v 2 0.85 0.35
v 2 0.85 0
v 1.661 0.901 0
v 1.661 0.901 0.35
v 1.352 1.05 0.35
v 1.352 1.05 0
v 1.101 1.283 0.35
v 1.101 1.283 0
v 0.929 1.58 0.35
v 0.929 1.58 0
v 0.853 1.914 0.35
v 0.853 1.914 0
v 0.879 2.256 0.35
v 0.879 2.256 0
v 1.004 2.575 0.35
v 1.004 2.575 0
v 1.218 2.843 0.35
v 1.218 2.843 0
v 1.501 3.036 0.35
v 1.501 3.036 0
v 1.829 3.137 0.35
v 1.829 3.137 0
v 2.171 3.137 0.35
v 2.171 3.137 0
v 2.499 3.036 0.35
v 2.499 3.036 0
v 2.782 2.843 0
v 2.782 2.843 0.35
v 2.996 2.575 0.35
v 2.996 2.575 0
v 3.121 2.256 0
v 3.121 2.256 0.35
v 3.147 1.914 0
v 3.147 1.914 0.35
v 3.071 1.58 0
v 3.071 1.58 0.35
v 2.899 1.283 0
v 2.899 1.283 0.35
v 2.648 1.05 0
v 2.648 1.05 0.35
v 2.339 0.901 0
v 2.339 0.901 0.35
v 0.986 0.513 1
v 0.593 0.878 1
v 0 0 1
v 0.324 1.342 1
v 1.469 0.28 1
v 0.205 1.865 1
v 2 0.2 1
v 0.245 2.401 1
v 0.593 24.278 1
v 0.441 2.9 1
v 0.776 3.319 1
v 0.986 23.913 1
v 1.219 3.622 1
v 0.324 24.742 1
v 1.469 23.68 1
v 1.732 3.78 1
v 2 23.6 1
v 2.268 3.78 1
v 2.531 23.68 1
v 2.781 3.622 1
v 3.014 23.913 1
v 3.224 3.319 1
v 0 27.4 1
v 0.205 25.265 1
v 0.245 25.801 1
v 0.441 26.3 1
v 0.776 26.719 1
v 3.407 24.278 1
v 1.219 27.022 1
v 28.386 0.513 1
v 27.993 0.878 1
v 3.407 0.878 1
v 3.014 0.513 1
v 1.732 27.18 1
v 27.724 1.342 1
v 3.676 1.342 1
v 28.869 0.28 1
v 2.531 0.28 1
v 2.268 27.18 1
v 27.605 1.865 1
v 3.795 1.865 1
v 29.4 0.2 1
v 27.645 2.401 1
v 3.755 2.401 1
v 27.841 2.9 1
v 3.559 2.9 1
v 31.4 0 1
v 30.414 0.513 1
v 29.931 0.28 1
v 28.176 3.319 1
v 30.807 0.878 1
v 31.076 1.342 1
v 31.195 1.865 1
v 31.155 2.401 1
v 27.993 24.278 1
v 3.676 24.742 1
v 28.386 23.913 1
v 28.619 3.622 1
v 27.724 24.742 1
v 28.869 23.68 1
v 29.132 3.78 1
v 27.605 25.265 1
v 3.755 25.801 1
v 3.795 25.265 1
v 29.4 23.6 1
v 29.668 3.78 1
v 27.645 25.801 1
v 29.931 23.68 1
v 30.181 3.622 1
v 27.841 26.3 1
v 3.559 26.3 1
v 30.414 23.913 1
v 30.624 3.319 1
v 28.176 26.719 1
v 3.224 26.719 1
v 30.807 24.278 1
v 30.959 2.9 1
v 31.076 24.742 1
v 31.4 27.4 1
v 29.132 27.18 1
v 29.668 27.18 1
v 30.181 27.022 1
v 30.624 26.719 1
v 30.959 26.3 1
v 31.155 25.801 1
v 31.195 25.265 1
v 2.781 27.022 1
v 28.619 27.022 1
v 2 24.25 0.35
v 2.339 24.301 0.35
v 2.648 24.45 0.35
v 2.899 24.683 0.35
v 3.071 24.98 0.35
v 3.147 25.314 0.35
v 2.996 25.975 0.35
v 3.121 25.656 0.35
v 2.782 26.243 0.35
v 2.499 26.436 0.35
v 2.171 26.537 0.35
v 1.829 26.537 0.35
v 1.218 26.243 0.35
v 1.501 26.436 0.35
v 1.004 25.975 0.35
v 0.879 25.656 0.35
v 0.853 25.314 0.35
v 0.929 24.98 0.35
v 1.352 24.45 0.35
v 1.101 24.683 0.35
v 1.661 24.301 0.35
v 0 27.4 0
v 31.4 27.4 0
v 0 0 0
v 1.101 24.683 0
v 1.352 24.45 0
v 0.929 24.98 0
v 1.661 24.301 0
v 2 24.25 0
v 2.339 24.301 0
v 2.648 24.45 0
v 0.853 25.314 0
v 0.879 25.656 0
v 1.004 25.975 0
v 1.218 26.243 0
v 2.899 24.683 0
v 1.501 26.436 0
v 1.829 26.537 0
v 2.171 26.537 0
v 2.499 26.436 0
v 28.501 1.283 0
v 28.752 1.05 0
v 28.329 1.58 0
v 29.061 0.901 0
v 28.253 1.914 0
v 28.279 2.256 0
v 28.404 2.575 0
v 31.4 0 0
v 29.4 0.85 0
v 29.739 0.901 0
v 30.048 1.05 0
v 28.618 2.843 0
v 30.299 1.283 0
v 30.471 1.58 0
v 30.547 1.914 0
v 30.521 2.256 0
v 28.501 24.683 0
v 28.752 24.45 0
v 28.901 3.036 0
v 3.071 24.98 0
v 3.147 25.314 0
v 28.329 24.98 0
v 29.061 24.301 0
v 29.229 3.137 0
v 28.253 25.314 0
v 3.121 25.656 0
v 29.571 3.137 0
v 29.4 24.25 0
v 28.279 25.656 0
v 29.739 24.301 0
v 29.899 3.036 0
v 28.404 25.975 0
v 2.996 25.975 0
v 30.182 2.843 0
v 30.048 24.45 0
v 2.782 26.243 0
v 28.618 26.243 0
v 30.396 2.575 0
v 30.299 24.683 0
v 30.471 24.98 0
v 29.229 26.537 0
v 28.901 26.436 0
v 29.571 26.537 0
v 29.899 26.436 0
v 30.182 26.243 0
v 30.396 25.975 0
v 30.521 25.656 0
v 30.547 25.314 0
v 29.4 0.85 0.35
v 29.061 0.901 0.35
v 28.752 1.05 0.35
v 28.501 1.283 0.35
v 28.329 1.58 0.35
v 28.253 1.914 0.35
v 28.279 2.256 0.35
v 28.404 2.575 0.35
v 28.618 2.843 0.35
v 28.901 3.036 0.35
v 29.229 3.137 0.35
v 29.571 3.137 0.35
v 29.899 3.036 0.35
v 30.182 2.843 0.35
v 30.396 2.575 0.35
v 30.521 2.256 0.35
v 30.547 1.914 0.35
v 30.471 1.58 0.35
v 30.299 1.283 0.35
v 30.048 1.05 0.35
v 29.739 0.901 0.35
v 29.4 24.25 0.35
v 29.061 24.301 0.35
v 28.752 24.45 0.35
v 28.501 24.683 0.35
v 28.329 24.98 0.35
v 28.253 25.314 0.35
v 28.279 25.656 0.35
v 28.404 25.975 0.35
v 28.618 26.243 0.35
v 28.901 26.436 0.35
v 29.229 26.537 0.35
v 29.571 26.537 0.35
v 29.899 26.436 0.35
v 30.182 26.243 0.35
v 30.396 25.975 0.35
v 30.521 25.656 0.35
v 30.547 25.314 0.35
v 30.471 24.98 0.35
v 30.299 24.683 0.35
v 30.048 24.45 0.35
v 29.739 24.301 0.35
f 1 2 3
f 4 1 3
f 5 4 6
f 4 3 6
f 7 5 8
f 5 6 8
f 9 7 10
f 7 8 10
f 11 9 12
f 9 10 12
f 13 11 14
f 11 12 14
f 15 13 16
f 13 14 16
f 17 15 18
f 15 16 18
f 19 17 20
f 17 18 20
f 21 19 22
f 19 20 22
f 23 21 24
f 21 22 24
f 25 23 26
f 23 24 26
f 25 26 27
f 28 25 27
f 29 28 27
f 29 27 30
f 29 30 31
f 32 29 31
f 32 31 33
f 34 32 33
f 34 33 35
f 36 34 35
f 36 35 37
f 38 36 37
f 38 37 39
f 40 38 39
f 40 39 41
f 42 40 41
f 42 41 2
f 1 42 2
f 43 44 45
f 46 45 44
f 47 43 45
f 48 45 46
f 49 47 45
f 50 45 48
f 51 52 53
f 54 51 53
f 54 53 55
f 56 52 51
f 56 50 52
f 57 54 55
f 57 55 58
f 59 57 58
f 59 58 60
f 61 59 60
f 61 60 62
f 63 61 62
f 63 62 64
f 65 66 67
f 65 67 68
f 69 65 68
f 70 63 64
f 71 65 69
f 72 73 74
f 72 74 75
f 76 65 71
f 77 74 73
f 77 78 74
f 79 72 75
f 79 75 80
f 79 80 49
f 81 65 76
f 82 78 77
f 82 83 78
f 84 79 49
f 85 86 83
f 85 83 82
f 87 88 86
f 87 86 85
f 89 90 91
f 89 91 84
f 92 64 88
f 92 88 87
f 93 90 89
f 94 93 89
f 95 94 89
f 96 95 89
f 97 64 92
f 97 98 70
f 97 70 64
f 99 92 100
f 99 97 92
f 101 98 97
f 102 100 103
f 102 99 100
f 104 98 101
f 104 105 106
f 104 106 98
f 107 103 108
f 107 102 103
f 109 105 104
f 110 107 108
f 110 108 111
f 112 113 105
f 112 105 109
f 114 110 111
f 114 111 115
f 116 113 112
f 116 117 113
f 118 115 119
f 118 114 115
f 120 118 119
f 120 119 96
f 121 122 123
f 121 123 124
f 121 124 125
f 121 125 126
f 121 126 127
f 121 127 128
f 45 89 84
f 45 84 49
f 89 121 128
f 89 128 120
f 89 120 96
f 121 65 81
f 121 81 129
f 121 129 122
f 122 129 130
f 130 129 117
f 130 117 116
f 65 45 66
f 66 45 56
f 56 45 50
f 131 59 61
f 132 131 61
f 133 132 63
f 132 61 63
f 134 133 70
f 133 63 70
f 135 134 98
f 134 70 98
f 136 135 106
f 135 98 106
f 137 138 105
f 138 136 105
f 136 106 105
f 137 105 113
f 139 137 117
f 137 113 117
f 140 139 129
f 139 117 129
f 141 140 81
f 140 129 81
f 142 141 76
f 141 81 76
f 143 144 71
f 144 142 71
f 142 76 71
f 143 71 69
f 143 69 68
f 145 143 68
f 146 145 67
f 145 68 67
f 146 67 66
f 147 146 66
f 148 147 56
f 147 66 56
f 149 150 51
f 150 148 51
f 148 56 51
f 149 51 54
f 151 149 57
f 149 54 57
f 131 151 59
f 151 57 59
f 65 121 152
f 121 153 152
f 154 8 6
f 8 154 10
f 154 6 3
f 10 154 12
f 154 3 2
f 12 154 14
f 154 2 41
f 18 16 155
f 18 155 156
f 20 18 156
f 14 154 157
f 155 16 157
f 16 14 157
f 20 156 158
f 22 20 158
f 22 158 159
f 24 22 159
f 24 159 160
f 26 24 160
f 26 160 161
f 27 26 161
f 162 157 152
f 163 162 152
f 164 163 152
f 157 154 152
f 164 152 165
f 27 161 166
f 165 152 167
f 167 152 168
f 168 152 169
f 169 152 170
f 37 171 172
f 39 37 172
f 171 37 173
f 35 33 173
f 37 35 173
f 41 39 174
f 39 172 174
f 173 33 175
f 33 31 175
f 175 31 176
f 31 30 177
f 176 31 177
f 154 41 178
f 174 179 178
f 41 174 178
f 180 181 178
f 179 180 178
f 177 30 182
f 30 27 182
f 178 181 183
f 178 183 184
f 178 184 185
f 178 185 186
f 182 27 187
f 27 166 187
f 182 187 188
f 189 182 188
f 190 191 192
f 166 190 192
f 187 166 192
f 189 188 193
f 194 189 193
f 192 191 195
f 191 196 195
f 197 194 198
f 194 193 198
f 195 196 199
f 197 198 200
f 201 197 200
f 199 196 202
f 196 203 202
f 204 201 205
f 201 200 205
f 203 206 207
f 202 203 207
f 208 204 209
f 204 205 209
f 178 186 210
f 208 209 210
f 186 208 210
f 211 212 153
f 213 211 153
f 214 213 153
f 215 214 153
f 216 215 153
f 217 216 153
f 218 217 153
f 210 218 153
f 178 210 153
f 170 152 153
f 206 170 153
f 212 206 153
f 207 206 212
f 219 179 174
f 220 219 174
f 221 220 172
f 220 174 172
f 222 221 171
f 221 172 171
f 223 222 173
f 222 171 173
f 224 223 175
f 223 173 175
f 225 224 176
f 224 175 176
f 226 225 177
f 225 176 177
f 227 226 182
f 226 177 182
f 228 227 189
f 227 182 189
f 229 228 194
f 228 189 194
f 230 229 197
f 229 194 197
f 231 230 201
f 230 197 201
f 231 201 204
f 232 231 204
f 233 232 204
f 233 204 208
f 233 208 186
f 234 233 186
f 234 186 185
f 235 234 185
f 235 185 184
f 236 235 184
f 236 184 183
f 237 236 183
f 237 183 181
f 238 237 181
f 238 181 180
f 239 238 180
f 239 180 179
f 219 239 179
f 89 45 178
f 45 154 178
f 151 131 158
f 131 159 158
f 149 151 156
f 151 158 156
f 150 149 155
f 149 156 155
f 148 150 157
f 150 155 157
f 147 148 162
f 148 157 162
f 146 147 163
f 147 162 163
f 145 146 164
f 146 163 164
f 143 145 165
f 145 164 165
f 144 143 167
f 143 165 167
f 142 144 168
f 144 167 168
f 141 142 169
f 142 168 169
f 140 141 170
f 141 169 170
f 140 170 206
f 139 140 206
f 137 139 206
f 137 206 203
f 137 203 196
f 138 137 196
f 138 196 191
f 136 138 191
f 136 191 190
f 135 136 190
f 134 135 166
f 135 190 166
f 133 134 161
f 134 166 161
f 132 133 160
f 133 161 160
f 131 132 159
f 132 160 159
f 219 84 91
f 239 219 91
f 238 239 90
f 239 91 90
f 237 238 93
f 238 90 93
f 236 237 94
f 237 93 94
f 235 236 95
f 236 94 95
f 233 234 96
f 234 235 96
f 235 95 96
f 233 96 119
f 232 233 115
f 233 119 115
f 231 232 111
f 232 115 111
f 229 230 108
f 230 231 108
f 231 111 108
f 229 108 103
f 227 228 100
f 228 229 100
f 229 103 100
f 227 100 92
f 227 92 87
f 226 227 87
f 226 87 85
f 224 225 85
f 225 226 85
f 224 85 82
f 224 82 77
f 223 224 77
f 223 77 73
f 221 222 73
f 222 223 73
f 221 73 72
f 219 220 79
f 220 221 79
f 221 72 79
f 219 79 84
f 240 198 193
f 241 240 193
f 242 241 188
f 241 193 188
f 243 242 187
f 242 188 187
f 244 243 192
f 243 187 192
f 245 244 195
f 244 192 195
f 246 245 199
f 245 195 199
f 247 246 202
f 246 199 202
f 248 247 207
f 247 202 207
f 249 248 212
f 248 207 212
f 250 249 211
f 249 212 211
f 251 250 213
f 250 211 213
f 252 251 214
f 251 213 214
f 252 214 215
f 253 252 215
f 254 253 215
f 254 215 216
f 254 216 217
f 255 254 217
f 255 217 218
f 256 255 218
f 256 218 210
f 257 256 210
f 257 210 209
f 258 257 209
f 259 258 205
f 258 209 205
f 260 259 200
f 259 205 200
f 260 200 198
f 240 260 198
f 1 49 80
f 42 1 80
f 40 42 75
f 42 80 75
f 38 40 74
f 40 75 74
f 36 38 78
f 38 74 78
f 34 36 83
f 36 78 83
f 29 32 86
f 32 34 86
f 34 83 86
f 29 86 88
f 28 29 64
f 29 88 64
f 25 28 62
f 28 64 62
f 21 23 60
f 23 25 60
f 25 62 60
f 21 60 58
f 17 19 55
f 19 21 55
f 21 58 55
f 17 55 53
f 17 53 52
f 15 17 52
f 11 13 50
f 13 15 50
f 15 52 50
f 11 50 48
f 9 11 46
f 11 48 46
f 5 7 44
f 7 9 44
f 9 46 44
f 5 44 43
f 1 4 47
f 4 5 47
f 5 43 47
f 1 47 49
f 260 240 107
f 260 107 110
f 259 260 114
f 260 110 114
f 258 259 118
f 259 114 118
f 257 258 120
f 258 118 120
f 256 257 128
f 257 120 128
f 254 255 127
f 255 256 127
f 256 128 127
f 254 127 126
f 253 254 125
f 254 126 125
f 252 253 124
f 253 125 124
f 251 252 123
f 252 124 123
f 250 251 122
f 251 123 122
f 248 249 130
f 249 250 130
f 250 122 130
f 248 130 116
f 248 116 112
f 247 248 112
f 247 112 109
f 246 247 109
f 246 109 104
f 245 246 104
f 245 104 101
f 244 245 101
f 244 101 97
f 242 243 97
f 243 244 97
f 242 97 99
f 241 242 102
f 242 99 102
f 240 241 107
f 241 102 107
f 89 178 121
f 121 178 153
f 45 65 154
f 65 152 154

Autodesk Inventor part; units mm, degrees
ref_plane "YZ Plane" through (0, 0, 0) normal (1, 0, 0) x (0, 1, 0)
ref_plane "XZ Plane" through (0, 0, 0) normal (0, 1, 0) x (-1, 0, 0)
ref_plane "XY Plane" through (0, 0, 0) normal (0, 0, 1) x (1, 0, 0)
sketch "Sketch1" plane through (0, 0, 0) normal (0, 0, 1) x (1, 0, 0)
  line L0 (0, 0) -> (31.4, 0)
  line L1 (31.4, 0) -> (31.4, 27.4)
  line L2 (31.4, 27.4) -> (0, 27.4)
  line L3 (0, 27.4) -> (0, 0)
  dimension "d0" = 31.4
  dimension "d1" = 27.4
extrude "Extrusion1" add sketch "Sketch1" along normal blind 1
sketch "Sketch17" plane through (0, 0, 1) normal (0, 0, 1) x (1, 0, 0)
  line L0 (2, 25.4) -> (29.4, 25.4) construction
  line L1 (29.4, 25.4) -> (29.4, 2) construction
  line L2 (29.4, 2) -> (2, 2) construction
  line L3 (2, 2) -> (2, 25.4) construction
  line L4 (0, 0) -> (0, 27.4) construction
  line L5 (0, 27.4) -> (31.4, 27.4) construction
  dimension "d169" = 27.4
  dimension "d170" = 23.4
  dimension "d171" = 2
  dimension "d172" = 2
hole "Hole16" at (2, 25.4, 1) at (29.4, 25.4, 1) at (29.4, 2, 1) at (2, 2, 1) direction (0, 0, -1) diameter 2.3 end through all countersink diameter 3.6 countersink angle 90
properties part number "Mixer IQ Box ND20" material "Aluminum-6061"
